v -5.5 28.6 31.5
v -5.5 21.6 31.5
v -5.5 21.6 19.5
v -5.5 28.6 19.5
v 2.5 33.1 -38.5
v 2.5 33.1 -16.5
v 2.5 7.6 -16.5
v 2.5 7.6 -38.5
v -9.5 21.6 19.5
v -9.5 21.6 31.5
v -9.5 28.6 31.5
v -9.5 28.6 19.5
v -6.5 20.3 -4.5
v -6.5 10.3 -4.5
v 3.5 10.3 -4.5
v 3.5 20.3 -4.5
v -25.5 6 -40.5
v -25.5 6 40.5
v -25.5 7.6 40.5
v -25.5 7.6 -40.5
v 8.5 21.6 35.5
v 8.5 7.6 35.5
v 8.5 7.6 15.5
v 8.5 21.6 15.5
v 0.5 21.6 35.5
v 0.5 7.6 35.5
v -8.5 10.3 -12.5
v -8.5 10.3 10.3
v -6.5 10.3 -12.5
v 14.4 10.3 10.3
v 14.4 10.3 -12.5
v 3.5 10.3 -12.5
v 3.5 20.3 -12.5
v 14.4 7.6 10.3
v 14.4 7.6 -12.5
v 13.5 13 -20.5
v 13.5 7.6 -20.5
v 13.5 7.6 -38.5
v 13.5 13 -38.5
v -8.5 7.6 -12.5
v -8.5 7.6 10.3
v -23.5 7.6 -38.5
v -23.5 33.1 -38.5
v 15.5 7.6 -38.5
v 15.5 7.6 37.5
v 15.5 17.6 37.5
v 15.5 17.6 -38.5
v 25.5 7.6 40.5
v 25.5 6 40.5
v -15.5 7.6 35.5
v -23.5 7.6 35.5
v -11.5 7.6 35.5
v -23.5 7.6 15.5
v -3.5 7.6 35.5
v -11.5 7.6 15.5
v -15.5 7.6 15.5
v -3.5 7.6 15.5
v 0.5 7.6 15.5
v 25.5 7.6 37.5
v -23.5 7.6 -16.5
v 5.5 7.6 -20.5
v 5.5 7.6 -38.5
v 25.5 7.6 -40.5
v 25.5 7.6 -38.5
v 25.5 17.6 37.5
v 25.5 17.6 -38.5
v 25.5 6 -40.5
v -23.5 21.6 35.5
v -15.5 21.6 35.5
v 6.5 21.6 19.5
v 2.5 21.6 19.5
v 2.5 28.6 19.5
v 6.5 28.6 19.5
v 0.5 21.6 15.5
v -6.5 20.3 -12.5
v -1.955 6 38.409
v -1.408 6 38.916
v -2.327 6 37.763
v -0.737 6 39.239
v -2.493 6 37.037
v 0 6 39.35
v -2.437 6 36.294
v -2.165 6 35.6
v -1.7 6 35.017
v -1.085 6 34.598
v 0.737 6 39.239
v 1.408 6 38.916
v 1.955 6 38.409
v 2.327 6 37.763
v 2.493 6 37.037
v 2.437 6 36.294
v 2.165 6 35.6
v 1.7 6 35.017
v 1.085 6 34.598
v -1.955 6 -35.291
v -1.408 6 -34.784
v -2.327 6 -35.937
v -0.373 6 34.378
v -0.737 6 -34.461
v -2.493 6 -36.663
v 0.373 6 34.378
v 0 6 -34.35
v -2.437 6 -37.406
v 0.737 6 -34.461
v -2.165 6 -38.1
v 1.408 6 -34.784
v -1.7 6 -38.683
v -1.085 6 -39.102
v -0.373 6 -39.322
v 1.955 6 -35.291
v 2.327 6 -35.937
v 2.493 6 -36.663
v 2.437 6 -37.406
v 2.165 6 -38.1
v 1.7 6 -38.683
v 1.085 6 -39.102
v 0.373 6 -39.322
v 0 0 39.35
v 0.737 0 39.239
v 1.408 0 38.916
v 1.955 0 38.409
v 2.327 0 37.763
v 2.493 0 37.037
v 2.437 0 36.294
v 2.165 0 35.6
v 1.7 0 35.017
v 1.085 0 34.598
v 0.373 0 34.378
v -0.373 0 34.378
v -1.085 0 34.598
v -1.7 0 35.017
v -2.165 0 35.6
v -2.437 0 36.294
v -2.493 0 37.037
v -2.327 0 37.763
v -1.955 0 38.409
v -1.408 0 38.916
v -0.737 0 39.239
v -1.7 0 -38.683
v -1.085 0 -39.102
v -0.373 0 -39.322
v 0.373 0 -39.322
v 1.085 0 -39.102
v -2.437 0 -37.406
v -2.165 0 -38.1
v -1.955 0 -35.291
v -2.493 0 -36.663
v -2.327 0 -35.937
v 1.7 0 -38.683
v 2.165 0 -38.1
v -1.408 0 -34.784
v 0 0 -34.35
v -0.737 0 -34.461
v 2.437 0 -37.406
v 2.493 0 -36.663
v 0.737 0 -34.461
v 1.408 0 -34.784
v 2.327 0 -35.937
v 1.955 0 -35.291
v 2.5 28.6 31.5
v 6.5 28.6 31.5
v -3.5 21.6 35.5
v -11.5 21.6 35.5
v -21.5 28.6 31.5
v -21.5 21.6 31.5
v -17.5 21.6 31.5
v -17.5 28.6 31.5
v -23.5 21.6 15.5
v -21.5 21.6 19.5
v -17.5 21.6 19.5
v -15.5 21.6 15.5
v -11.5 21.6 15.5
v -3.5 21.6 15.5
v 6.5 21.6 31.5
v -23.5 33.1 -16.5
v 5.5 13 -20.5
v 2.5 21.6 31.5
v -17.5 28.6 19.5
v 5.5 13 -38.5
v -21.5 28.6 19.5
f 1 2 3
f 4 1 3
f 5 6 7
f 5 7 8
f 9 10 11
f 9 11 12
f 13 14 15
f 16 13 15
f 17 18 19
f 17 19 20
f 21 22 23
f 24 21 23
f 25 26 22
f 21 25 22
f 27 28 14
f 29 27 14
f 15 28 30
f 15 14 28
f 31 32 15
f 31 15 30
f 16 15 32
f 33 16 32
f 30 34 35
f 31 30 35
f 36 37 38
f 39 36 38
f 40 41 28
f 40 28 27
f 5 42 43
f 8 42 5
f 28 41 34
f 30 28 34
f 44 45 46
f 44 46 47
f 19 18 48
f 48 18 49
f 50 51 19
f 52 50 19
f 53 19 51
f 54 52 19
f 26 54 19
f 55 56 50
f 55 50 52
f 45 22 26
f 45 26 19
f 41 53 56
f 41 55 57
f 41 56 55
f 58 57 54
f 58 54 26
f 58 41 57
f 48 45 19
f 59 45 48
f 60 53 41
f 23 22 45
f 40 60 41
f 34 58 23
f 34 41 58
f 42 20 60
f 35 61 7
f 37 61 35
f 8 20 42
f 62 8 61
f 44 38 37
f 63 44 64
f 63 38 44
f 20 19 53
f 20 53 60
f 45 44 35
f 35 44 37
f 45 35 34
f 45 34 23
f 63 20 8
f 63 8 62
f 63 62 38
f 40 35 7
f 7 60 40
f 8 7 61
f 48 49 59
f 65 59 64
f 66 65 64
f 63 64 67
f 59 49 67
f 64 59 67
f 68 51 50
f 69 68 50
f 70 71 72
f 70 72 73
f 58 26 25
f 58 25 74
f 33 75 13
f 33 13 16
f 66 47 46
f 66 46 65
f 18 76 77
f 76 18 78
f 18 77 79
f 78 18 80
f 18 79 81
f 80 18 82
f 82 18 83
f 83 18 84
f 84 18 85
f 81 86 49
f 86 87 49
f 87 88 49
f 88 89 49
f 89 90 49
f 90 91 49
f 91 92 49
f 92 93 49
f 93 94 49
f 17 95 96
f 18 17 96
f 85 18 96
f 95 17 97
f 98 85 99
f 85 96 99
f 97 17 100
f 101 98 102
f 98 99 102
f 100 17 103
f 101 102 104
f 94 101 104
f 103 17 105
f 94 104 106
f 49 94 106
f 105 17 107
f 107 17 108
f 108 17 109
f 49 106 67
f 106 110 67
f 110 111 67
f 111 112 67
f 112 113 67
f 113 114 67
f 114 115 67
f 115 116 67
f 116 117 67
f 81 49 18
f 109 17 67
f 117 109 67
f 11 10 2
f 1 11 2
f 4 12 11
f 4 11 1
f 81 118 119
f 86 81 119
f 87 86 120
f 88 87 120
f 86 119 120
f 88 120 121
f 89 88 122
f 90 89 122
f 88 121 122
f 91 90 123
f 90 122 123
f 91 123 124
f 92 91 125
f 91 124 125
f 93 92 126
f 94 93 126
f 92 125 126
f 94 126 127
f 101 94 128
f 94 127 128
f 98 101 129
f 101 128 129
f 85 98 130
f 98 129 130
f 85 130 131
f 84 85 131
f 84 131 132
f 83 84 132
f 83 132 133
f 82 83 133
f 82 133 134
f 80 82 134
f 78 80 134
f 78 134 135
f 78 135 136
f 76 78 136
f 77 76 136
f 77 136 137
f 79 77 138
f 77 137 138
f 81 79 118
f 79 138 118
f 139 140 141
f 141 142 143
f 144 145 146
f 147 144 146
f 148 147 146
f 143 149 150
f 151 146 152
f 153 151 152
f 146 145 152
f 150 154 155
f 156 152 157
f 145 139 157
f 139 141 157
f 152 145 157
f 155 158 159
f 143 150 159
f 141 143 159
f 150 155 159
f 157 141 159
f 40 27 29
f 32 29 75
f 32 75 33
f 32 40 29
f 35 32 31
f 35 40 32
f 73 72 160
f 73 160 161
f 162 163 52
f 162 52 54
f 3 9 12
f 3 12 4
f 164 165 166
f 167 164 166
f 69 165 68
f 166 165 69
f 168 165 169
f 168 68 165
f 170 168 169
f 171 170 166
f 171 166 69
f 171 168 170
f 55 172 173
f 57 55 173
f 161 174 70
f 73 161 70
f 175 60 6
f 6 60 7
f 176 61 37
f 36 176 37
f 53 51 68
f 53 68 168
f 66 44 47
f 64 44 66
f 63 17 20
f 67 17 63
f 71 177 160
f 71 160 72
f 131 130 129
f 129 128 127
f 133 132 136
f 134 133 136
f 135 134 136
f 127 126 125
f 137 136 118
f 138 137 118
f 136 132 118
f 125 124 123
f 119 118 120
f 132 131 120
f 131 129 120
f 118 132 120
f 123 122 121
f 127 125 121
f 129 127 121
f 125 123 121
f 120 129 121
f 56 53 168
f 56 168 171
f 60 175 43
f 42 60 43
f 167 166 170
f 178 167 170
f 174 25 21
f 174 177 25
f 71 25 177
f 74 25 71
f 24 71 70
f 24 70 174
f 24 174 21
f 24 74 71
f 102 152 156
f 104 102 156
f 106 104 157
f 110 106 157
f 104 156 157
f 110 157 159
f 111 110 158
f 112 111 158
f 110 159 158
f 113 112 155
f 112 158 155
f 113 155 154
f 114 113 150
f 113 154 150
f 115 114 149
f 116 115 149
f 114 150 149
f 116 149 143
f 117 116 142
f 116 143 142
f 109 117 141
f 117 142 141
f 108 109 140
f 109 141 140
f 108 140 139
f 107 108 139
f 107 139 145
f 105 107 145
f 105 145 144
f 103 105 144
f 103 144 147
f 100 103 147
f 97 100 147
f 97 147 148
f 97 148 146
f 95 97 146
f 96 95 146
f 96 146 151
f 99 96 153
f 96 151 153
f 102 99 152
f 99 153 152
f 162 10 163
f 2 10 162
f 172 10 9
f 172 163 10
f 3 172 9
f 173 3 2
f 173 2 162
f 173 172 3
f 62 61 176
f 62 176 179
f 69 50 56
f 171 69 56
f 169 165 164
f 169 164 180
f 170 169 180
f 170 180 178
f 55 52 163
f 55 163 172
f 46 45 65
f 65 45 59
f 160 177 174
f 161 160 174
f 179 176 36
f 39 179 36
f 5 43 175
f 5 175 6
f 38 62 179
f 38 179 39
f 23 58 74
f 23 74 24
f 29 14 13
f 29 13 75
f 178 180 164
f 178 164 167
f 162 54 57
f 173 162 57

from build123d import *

# Parameters (mm, degrees)
SK_P01_STANDOFF_R                  = 2.5
P01_STANDOFF_DEPTH                 = 6
SK_P02_STANDOFF_R                  = 2.5
P02_STANDOFF_DEPTH                 = 6
P03_PERMAPROTOHALFSIZEBOARD_START  = 6
SK_P03_PERMAPROTOHALFSIZEBOARD_W   = 51
SK_P03_PERMAPROTOHALFSIZEBOARD_H   = 81
P03_PERMAPROTOHALFSIZEBOARD_DEPTH  = 1.6
P04_K1RELAYCB1AFP12V_START         = 7.6
SK_P04_K1RELAYCB1AFP12V_W          = 26
SK_P04_K1RELAYCB1AFP12V_H          = 22
P04_K1RELAYCB1AFP12V_DEPTH         = 25.5
P05_R1D3D4K1COIL_START             = 7.6
SK_P05_R1D3D4K1COIL_W              = 8
SK_P05_R1D3D4K1COIL_H              = 18
P05_R1D3D4K1COIL_DEPTH             = 5.4
P06_INA2601MOTOR_START             = 7.6
SK_P06_INA2601MOTOR_W              = 22.9
SK_P06_INA2601MOTOR_H              = 22.8
P06_INA2601MOTOR_DEPTH             = 2.7
P07_INA260TERMINALBLOCK_START      = 10.3
SK_P07_INA260TERMINALBLOCK_W       = 10
SK_P07_INA260TERMINALBLOCK_H       = 8
P07_INA260TERMINALBLOCK_DEPTH      = 10
P08_F1HOLDER30APCBBLADE_START      = 7.6
SK_P08_F1HOLDER30APCBBLADE_W       = 8
SK_P08_F1HOLDER30APCBBLADE_H       = 20
P08_F1HOLDER30APCBBLADE_DEPTH      = 14
P09_F115AFUSE_START                = 21.6
SK_P09_F115AFUSE_W                 = 4
SK_P09_F115AFUSE_H                 = 12
P09_F115AFUSE_DEPTH                = 7
P10_F3HOLDER_START                 = 7.6
SK_P10_F3HOLDER_W                  = 8
SK_P10_F3HOLDER_H                  = 20
P10_F3HOLDER_DEPTH                 = 14
P11_F33AFUSE_START                 = 21.6
SK_P11_F33AFUSE_W                  = 4
SK_P11_F33AFUSE_H                  = 12
P11_F33AFUSE_DEPTH                 = 7
P12_F4HOLDER_START                 = 7.6
SK_P12_F4HOLDER_W                  = 8
SK_P12_F4HOLDER_H                  = 20
P12_F4HOLDER_DEPTH                 = 14
P13_F43AFUSE_START                 = 21.6
SK_P13_F43AFUSE_W                  = 4
SK_P13_F43AFUSE_H                  = 12
P13_F43AFUSE_DEPTH                 = 7
P14_TERMINALBLOCKSTB1TB4WIRE_START = 7.6
SK_P14_TERMINALBLOCKSTB1TB4WIRE_W  = 10
SK_P14_TERMINALBLOCKSTB1TB4WIRE_H  = 76
P14_TERMINALBLOCKSTB1TB4WIRE_DEPTH = 10


with BuildPart() as part:
    # SK_P01_Standoff → P01_Standoff (new body)
    with BuildSketch(Plane(origin=(0, 0, 0), x_dir=(1, 0, 0), z_dir=(0, 1, 0))):
        with Locations(Location((0, 36.85, 0), (0, 0, 270))):
            Circle(SK_P01_STANDOFF_R)
    extrude(amount=P01_STANDOFF_DEPTH)



with BuildPart() as body_2:
    # SK_P02_Standoff → P02_Standoff (new body)
    with BuildSketch(Plane(origin=(0, 0, 0), x_dir=(1, 0, 0), z_dir=(0, 1, 0))):
        with Locations(Location((0, -36.85, 0), (0, 0, 270))):
            Circle(SK_P02_STANDOFF_R)
    extrude(amount=P02_STANDOFF_DEPTH)


with BuildPart() as part_1:
    add(part.part)

    add(body_2.part)  # P03_PermaProtohalfsizeboard merges body 2
    # SK_P03_PermaProtohalfsizeboard → P03_PermaProtohalfsizeboard (add)
    with BuildSketch(Plane(origin=(0, 0, 0), x_dir=(1, 0, 0), z_dir=(0, 1, 0)).offset(P03_PERMAPROTOHALFSIZEBOARD_START)):
        Rectangle(SK_P03_PERMAPROTOHALFSIZEBOARD_W, SK_P03_PERMAPROTOHALFSIZEBOARD_H)
    extrude(amount=P03_PERMAPROTOHALFSIZEBOARD_DEPTH)

    # SK_P04_K1relayCB1aFP12V → P04_K1relayCB1aFP12V (add)
    with BuildSketch(Plane(origin=(0, 0, 0), x_dir=(1, 0, 0), z_dir=(0, 1, 0)).offset(P04_K1RELAYCB1AFP12V_START)):
        with Locations((-10.5, 27.5)):
            Rectangle(SK_P04_K1RELAYCB1AFP12V_W, SK_P04_K1RELAYCB1AFP12V_H)
    extrude(amount=P04_K1RELAYCB1AFP12V_DEPTH)

    # SK_P05_R1D3D4K1coil → P05_R1D3D4K1coil (add)
    with BuildSketch(Plane(origin=(0, 0, 0), x_dir=(1, 0, 0), z_dir=(0, 1, 0)).offset(P05_R1D3D4K1COIL_START)):
        with Locations((9.5, 29.5)):
            Rectangle(SK_P05_R1D3D4K1COIL_W, SK_P05_R1D3D4K1COIL_H)
    extrude(amount=P05_R1D3D4K1COIL_DEPTH)

    # SK_P06_INA2601motor → P06_INA2601motor (add)
    with BuildSketch(Plane(origin=(0, 0, 0), x_dir=(1, 0, 0), z_dir=(0, 1, 0)).offset(P06_INA2601MOTOR_START)):
        with Locations((2.95, 1.1)):
            Rectangle(SK_P06_INA2601MOTOR_W, SK_P06_INA2601MOTOR_H)
    extrude(amount=P06_INA2601MOTOR_DEPTH)

    # SK_P07_INA260terminalblock → P07_INA260terminalblock (add)
    with BuildSketch(Plane(origin=(0, 0, 0), x_dir=(1, 0, 0), z_dir=(0, 1, 0)).offset(P07_INA260TERMINALBLOCK_START)):
        with Locations((-1.5, 8.5)):
            Rectangle(SK_P07_INA260TERMINALBLOCK_W, SK_P07_INA260TERMINALBLOCK_H)
    extrude(amount=P07_INA260TERMINALBLOCK_DEPTH)

    # SK_P08_F1holder30APCBblade → P08_F1holder30APCBblade (add)
    with BuildSketch(Plane(origin=(0, 0, 0), x_dir=(1, 0, 0), z_dir=(0, 1, 0)).offset(P08_F1HOLDER30APCBBLADE_START)):
        with Locations((-19.5, -25.5)):
            Rectangle(SK_P08_F1HOLDER30APCBBLADE_W, SK_P08_F1HOLDER30APCBBLADE_H)
    extrude(amount=P08_F1HOLDER30APCBBLADE_DEPTH)

    # SK_P09_F115Afuse → P09_F115Afuse (add)
    with BuildSketch(Plane(origin=(0, 0, 0), x_dir=(1, 0, 0), z_dir=(0, 1, 0)).offset(P09_F115AFUSE_START)):
        with Locations((-19.5, -25.5)):
            Rectangle(SK_P09_F115AFUSE_W, SK_P09_F115AFUSE_H)
    extrude(amount=P09_F115AFUSE_DEPTH)

    # SK_P10_F3holder → P10_F3holder (add)
    with BuildSketch(Plane(origin=(0, 0, 0), x_dir=(1, 0, 0), z_dir=(0, 1, 0)).offset(P10_F3HOLDER_START)):
        with Locations((-7.5, -25.5)):
            Rectangle(SK_P10_F3HOLDER_W, SK_P10_F3HOLDER_H)
    extrude(amount=P10_F3HOLDER_DEPTH)

    # SK_P11_F33Afuse → P11_F33Afuse (add)
    with BuildSketch(Plane(origin=(0, 0, 0), x_dir=(1, 0, 0), z_dir=(0, 1, 0)).offset(P11_F33AFUSE_START)):
        with Locations((-7.5, -25.5)):
            Rectangle(SK_P11_F33AFUSE_W, SK_P11_F33AFUSE_H)
    extrude(amount=P11_F33AFUSE_DEPTH)

    # SK_P12_F4holder → P12_F4holder (add)
    with BuildSketch(Plane(origin=(0, 0, 0), x_dir=(1, 0, 0), z_dir=(0, 1, 0)).offset(P12_F4HOLDER_START)):
        with Locations((4.5, -25.5)):
            Rectangle(SK_P12_F4HOLDER_W, SK_P12_F4HOLDER_H)
    extrude(amount=P12_F4HOLDER_DEPTH)

    # SK_P13_F43Afuse → P13_F43Afuse (add)
    with BuildSketch(Plane(origin=(0, 0, 0), x_dir=(1, 0, 0), z_dir=(0, 1, 0)).offset(P13_F43AFUSE_START)):
        with Locations((4.5, -25.5)):
            Rectangle(SK_P13_F43AFUSE_W, SK_P13_F43AFUSE_H)
    extrude(amount=P13_F43AFUSE_DEPTH)

    # SK_P14_TerminalblocksTB1TB4wire → P14_TerminalblocksTB1TB4wire (add)
    with BuildSketch(Plane(origin=(0, 0, 0), x_dir=(1, 0, 0), z_dir=(0, 1, 0)).offset(P14_TERMINALBLOCKSTB1TB4WIRE_START)):
        with Locations((20.5, 0.5)):
            Rectangle(SK_P14_TERMINALBLOCKSTB1TB4WIRE_W, SK_P14_TERMINALBLOCKSTB1TB4WIRE_H)
    extrude(amount=P14_TERMINALBLOCKSTB1TB4WIRE_DEPTH)


solid = part_1.part
